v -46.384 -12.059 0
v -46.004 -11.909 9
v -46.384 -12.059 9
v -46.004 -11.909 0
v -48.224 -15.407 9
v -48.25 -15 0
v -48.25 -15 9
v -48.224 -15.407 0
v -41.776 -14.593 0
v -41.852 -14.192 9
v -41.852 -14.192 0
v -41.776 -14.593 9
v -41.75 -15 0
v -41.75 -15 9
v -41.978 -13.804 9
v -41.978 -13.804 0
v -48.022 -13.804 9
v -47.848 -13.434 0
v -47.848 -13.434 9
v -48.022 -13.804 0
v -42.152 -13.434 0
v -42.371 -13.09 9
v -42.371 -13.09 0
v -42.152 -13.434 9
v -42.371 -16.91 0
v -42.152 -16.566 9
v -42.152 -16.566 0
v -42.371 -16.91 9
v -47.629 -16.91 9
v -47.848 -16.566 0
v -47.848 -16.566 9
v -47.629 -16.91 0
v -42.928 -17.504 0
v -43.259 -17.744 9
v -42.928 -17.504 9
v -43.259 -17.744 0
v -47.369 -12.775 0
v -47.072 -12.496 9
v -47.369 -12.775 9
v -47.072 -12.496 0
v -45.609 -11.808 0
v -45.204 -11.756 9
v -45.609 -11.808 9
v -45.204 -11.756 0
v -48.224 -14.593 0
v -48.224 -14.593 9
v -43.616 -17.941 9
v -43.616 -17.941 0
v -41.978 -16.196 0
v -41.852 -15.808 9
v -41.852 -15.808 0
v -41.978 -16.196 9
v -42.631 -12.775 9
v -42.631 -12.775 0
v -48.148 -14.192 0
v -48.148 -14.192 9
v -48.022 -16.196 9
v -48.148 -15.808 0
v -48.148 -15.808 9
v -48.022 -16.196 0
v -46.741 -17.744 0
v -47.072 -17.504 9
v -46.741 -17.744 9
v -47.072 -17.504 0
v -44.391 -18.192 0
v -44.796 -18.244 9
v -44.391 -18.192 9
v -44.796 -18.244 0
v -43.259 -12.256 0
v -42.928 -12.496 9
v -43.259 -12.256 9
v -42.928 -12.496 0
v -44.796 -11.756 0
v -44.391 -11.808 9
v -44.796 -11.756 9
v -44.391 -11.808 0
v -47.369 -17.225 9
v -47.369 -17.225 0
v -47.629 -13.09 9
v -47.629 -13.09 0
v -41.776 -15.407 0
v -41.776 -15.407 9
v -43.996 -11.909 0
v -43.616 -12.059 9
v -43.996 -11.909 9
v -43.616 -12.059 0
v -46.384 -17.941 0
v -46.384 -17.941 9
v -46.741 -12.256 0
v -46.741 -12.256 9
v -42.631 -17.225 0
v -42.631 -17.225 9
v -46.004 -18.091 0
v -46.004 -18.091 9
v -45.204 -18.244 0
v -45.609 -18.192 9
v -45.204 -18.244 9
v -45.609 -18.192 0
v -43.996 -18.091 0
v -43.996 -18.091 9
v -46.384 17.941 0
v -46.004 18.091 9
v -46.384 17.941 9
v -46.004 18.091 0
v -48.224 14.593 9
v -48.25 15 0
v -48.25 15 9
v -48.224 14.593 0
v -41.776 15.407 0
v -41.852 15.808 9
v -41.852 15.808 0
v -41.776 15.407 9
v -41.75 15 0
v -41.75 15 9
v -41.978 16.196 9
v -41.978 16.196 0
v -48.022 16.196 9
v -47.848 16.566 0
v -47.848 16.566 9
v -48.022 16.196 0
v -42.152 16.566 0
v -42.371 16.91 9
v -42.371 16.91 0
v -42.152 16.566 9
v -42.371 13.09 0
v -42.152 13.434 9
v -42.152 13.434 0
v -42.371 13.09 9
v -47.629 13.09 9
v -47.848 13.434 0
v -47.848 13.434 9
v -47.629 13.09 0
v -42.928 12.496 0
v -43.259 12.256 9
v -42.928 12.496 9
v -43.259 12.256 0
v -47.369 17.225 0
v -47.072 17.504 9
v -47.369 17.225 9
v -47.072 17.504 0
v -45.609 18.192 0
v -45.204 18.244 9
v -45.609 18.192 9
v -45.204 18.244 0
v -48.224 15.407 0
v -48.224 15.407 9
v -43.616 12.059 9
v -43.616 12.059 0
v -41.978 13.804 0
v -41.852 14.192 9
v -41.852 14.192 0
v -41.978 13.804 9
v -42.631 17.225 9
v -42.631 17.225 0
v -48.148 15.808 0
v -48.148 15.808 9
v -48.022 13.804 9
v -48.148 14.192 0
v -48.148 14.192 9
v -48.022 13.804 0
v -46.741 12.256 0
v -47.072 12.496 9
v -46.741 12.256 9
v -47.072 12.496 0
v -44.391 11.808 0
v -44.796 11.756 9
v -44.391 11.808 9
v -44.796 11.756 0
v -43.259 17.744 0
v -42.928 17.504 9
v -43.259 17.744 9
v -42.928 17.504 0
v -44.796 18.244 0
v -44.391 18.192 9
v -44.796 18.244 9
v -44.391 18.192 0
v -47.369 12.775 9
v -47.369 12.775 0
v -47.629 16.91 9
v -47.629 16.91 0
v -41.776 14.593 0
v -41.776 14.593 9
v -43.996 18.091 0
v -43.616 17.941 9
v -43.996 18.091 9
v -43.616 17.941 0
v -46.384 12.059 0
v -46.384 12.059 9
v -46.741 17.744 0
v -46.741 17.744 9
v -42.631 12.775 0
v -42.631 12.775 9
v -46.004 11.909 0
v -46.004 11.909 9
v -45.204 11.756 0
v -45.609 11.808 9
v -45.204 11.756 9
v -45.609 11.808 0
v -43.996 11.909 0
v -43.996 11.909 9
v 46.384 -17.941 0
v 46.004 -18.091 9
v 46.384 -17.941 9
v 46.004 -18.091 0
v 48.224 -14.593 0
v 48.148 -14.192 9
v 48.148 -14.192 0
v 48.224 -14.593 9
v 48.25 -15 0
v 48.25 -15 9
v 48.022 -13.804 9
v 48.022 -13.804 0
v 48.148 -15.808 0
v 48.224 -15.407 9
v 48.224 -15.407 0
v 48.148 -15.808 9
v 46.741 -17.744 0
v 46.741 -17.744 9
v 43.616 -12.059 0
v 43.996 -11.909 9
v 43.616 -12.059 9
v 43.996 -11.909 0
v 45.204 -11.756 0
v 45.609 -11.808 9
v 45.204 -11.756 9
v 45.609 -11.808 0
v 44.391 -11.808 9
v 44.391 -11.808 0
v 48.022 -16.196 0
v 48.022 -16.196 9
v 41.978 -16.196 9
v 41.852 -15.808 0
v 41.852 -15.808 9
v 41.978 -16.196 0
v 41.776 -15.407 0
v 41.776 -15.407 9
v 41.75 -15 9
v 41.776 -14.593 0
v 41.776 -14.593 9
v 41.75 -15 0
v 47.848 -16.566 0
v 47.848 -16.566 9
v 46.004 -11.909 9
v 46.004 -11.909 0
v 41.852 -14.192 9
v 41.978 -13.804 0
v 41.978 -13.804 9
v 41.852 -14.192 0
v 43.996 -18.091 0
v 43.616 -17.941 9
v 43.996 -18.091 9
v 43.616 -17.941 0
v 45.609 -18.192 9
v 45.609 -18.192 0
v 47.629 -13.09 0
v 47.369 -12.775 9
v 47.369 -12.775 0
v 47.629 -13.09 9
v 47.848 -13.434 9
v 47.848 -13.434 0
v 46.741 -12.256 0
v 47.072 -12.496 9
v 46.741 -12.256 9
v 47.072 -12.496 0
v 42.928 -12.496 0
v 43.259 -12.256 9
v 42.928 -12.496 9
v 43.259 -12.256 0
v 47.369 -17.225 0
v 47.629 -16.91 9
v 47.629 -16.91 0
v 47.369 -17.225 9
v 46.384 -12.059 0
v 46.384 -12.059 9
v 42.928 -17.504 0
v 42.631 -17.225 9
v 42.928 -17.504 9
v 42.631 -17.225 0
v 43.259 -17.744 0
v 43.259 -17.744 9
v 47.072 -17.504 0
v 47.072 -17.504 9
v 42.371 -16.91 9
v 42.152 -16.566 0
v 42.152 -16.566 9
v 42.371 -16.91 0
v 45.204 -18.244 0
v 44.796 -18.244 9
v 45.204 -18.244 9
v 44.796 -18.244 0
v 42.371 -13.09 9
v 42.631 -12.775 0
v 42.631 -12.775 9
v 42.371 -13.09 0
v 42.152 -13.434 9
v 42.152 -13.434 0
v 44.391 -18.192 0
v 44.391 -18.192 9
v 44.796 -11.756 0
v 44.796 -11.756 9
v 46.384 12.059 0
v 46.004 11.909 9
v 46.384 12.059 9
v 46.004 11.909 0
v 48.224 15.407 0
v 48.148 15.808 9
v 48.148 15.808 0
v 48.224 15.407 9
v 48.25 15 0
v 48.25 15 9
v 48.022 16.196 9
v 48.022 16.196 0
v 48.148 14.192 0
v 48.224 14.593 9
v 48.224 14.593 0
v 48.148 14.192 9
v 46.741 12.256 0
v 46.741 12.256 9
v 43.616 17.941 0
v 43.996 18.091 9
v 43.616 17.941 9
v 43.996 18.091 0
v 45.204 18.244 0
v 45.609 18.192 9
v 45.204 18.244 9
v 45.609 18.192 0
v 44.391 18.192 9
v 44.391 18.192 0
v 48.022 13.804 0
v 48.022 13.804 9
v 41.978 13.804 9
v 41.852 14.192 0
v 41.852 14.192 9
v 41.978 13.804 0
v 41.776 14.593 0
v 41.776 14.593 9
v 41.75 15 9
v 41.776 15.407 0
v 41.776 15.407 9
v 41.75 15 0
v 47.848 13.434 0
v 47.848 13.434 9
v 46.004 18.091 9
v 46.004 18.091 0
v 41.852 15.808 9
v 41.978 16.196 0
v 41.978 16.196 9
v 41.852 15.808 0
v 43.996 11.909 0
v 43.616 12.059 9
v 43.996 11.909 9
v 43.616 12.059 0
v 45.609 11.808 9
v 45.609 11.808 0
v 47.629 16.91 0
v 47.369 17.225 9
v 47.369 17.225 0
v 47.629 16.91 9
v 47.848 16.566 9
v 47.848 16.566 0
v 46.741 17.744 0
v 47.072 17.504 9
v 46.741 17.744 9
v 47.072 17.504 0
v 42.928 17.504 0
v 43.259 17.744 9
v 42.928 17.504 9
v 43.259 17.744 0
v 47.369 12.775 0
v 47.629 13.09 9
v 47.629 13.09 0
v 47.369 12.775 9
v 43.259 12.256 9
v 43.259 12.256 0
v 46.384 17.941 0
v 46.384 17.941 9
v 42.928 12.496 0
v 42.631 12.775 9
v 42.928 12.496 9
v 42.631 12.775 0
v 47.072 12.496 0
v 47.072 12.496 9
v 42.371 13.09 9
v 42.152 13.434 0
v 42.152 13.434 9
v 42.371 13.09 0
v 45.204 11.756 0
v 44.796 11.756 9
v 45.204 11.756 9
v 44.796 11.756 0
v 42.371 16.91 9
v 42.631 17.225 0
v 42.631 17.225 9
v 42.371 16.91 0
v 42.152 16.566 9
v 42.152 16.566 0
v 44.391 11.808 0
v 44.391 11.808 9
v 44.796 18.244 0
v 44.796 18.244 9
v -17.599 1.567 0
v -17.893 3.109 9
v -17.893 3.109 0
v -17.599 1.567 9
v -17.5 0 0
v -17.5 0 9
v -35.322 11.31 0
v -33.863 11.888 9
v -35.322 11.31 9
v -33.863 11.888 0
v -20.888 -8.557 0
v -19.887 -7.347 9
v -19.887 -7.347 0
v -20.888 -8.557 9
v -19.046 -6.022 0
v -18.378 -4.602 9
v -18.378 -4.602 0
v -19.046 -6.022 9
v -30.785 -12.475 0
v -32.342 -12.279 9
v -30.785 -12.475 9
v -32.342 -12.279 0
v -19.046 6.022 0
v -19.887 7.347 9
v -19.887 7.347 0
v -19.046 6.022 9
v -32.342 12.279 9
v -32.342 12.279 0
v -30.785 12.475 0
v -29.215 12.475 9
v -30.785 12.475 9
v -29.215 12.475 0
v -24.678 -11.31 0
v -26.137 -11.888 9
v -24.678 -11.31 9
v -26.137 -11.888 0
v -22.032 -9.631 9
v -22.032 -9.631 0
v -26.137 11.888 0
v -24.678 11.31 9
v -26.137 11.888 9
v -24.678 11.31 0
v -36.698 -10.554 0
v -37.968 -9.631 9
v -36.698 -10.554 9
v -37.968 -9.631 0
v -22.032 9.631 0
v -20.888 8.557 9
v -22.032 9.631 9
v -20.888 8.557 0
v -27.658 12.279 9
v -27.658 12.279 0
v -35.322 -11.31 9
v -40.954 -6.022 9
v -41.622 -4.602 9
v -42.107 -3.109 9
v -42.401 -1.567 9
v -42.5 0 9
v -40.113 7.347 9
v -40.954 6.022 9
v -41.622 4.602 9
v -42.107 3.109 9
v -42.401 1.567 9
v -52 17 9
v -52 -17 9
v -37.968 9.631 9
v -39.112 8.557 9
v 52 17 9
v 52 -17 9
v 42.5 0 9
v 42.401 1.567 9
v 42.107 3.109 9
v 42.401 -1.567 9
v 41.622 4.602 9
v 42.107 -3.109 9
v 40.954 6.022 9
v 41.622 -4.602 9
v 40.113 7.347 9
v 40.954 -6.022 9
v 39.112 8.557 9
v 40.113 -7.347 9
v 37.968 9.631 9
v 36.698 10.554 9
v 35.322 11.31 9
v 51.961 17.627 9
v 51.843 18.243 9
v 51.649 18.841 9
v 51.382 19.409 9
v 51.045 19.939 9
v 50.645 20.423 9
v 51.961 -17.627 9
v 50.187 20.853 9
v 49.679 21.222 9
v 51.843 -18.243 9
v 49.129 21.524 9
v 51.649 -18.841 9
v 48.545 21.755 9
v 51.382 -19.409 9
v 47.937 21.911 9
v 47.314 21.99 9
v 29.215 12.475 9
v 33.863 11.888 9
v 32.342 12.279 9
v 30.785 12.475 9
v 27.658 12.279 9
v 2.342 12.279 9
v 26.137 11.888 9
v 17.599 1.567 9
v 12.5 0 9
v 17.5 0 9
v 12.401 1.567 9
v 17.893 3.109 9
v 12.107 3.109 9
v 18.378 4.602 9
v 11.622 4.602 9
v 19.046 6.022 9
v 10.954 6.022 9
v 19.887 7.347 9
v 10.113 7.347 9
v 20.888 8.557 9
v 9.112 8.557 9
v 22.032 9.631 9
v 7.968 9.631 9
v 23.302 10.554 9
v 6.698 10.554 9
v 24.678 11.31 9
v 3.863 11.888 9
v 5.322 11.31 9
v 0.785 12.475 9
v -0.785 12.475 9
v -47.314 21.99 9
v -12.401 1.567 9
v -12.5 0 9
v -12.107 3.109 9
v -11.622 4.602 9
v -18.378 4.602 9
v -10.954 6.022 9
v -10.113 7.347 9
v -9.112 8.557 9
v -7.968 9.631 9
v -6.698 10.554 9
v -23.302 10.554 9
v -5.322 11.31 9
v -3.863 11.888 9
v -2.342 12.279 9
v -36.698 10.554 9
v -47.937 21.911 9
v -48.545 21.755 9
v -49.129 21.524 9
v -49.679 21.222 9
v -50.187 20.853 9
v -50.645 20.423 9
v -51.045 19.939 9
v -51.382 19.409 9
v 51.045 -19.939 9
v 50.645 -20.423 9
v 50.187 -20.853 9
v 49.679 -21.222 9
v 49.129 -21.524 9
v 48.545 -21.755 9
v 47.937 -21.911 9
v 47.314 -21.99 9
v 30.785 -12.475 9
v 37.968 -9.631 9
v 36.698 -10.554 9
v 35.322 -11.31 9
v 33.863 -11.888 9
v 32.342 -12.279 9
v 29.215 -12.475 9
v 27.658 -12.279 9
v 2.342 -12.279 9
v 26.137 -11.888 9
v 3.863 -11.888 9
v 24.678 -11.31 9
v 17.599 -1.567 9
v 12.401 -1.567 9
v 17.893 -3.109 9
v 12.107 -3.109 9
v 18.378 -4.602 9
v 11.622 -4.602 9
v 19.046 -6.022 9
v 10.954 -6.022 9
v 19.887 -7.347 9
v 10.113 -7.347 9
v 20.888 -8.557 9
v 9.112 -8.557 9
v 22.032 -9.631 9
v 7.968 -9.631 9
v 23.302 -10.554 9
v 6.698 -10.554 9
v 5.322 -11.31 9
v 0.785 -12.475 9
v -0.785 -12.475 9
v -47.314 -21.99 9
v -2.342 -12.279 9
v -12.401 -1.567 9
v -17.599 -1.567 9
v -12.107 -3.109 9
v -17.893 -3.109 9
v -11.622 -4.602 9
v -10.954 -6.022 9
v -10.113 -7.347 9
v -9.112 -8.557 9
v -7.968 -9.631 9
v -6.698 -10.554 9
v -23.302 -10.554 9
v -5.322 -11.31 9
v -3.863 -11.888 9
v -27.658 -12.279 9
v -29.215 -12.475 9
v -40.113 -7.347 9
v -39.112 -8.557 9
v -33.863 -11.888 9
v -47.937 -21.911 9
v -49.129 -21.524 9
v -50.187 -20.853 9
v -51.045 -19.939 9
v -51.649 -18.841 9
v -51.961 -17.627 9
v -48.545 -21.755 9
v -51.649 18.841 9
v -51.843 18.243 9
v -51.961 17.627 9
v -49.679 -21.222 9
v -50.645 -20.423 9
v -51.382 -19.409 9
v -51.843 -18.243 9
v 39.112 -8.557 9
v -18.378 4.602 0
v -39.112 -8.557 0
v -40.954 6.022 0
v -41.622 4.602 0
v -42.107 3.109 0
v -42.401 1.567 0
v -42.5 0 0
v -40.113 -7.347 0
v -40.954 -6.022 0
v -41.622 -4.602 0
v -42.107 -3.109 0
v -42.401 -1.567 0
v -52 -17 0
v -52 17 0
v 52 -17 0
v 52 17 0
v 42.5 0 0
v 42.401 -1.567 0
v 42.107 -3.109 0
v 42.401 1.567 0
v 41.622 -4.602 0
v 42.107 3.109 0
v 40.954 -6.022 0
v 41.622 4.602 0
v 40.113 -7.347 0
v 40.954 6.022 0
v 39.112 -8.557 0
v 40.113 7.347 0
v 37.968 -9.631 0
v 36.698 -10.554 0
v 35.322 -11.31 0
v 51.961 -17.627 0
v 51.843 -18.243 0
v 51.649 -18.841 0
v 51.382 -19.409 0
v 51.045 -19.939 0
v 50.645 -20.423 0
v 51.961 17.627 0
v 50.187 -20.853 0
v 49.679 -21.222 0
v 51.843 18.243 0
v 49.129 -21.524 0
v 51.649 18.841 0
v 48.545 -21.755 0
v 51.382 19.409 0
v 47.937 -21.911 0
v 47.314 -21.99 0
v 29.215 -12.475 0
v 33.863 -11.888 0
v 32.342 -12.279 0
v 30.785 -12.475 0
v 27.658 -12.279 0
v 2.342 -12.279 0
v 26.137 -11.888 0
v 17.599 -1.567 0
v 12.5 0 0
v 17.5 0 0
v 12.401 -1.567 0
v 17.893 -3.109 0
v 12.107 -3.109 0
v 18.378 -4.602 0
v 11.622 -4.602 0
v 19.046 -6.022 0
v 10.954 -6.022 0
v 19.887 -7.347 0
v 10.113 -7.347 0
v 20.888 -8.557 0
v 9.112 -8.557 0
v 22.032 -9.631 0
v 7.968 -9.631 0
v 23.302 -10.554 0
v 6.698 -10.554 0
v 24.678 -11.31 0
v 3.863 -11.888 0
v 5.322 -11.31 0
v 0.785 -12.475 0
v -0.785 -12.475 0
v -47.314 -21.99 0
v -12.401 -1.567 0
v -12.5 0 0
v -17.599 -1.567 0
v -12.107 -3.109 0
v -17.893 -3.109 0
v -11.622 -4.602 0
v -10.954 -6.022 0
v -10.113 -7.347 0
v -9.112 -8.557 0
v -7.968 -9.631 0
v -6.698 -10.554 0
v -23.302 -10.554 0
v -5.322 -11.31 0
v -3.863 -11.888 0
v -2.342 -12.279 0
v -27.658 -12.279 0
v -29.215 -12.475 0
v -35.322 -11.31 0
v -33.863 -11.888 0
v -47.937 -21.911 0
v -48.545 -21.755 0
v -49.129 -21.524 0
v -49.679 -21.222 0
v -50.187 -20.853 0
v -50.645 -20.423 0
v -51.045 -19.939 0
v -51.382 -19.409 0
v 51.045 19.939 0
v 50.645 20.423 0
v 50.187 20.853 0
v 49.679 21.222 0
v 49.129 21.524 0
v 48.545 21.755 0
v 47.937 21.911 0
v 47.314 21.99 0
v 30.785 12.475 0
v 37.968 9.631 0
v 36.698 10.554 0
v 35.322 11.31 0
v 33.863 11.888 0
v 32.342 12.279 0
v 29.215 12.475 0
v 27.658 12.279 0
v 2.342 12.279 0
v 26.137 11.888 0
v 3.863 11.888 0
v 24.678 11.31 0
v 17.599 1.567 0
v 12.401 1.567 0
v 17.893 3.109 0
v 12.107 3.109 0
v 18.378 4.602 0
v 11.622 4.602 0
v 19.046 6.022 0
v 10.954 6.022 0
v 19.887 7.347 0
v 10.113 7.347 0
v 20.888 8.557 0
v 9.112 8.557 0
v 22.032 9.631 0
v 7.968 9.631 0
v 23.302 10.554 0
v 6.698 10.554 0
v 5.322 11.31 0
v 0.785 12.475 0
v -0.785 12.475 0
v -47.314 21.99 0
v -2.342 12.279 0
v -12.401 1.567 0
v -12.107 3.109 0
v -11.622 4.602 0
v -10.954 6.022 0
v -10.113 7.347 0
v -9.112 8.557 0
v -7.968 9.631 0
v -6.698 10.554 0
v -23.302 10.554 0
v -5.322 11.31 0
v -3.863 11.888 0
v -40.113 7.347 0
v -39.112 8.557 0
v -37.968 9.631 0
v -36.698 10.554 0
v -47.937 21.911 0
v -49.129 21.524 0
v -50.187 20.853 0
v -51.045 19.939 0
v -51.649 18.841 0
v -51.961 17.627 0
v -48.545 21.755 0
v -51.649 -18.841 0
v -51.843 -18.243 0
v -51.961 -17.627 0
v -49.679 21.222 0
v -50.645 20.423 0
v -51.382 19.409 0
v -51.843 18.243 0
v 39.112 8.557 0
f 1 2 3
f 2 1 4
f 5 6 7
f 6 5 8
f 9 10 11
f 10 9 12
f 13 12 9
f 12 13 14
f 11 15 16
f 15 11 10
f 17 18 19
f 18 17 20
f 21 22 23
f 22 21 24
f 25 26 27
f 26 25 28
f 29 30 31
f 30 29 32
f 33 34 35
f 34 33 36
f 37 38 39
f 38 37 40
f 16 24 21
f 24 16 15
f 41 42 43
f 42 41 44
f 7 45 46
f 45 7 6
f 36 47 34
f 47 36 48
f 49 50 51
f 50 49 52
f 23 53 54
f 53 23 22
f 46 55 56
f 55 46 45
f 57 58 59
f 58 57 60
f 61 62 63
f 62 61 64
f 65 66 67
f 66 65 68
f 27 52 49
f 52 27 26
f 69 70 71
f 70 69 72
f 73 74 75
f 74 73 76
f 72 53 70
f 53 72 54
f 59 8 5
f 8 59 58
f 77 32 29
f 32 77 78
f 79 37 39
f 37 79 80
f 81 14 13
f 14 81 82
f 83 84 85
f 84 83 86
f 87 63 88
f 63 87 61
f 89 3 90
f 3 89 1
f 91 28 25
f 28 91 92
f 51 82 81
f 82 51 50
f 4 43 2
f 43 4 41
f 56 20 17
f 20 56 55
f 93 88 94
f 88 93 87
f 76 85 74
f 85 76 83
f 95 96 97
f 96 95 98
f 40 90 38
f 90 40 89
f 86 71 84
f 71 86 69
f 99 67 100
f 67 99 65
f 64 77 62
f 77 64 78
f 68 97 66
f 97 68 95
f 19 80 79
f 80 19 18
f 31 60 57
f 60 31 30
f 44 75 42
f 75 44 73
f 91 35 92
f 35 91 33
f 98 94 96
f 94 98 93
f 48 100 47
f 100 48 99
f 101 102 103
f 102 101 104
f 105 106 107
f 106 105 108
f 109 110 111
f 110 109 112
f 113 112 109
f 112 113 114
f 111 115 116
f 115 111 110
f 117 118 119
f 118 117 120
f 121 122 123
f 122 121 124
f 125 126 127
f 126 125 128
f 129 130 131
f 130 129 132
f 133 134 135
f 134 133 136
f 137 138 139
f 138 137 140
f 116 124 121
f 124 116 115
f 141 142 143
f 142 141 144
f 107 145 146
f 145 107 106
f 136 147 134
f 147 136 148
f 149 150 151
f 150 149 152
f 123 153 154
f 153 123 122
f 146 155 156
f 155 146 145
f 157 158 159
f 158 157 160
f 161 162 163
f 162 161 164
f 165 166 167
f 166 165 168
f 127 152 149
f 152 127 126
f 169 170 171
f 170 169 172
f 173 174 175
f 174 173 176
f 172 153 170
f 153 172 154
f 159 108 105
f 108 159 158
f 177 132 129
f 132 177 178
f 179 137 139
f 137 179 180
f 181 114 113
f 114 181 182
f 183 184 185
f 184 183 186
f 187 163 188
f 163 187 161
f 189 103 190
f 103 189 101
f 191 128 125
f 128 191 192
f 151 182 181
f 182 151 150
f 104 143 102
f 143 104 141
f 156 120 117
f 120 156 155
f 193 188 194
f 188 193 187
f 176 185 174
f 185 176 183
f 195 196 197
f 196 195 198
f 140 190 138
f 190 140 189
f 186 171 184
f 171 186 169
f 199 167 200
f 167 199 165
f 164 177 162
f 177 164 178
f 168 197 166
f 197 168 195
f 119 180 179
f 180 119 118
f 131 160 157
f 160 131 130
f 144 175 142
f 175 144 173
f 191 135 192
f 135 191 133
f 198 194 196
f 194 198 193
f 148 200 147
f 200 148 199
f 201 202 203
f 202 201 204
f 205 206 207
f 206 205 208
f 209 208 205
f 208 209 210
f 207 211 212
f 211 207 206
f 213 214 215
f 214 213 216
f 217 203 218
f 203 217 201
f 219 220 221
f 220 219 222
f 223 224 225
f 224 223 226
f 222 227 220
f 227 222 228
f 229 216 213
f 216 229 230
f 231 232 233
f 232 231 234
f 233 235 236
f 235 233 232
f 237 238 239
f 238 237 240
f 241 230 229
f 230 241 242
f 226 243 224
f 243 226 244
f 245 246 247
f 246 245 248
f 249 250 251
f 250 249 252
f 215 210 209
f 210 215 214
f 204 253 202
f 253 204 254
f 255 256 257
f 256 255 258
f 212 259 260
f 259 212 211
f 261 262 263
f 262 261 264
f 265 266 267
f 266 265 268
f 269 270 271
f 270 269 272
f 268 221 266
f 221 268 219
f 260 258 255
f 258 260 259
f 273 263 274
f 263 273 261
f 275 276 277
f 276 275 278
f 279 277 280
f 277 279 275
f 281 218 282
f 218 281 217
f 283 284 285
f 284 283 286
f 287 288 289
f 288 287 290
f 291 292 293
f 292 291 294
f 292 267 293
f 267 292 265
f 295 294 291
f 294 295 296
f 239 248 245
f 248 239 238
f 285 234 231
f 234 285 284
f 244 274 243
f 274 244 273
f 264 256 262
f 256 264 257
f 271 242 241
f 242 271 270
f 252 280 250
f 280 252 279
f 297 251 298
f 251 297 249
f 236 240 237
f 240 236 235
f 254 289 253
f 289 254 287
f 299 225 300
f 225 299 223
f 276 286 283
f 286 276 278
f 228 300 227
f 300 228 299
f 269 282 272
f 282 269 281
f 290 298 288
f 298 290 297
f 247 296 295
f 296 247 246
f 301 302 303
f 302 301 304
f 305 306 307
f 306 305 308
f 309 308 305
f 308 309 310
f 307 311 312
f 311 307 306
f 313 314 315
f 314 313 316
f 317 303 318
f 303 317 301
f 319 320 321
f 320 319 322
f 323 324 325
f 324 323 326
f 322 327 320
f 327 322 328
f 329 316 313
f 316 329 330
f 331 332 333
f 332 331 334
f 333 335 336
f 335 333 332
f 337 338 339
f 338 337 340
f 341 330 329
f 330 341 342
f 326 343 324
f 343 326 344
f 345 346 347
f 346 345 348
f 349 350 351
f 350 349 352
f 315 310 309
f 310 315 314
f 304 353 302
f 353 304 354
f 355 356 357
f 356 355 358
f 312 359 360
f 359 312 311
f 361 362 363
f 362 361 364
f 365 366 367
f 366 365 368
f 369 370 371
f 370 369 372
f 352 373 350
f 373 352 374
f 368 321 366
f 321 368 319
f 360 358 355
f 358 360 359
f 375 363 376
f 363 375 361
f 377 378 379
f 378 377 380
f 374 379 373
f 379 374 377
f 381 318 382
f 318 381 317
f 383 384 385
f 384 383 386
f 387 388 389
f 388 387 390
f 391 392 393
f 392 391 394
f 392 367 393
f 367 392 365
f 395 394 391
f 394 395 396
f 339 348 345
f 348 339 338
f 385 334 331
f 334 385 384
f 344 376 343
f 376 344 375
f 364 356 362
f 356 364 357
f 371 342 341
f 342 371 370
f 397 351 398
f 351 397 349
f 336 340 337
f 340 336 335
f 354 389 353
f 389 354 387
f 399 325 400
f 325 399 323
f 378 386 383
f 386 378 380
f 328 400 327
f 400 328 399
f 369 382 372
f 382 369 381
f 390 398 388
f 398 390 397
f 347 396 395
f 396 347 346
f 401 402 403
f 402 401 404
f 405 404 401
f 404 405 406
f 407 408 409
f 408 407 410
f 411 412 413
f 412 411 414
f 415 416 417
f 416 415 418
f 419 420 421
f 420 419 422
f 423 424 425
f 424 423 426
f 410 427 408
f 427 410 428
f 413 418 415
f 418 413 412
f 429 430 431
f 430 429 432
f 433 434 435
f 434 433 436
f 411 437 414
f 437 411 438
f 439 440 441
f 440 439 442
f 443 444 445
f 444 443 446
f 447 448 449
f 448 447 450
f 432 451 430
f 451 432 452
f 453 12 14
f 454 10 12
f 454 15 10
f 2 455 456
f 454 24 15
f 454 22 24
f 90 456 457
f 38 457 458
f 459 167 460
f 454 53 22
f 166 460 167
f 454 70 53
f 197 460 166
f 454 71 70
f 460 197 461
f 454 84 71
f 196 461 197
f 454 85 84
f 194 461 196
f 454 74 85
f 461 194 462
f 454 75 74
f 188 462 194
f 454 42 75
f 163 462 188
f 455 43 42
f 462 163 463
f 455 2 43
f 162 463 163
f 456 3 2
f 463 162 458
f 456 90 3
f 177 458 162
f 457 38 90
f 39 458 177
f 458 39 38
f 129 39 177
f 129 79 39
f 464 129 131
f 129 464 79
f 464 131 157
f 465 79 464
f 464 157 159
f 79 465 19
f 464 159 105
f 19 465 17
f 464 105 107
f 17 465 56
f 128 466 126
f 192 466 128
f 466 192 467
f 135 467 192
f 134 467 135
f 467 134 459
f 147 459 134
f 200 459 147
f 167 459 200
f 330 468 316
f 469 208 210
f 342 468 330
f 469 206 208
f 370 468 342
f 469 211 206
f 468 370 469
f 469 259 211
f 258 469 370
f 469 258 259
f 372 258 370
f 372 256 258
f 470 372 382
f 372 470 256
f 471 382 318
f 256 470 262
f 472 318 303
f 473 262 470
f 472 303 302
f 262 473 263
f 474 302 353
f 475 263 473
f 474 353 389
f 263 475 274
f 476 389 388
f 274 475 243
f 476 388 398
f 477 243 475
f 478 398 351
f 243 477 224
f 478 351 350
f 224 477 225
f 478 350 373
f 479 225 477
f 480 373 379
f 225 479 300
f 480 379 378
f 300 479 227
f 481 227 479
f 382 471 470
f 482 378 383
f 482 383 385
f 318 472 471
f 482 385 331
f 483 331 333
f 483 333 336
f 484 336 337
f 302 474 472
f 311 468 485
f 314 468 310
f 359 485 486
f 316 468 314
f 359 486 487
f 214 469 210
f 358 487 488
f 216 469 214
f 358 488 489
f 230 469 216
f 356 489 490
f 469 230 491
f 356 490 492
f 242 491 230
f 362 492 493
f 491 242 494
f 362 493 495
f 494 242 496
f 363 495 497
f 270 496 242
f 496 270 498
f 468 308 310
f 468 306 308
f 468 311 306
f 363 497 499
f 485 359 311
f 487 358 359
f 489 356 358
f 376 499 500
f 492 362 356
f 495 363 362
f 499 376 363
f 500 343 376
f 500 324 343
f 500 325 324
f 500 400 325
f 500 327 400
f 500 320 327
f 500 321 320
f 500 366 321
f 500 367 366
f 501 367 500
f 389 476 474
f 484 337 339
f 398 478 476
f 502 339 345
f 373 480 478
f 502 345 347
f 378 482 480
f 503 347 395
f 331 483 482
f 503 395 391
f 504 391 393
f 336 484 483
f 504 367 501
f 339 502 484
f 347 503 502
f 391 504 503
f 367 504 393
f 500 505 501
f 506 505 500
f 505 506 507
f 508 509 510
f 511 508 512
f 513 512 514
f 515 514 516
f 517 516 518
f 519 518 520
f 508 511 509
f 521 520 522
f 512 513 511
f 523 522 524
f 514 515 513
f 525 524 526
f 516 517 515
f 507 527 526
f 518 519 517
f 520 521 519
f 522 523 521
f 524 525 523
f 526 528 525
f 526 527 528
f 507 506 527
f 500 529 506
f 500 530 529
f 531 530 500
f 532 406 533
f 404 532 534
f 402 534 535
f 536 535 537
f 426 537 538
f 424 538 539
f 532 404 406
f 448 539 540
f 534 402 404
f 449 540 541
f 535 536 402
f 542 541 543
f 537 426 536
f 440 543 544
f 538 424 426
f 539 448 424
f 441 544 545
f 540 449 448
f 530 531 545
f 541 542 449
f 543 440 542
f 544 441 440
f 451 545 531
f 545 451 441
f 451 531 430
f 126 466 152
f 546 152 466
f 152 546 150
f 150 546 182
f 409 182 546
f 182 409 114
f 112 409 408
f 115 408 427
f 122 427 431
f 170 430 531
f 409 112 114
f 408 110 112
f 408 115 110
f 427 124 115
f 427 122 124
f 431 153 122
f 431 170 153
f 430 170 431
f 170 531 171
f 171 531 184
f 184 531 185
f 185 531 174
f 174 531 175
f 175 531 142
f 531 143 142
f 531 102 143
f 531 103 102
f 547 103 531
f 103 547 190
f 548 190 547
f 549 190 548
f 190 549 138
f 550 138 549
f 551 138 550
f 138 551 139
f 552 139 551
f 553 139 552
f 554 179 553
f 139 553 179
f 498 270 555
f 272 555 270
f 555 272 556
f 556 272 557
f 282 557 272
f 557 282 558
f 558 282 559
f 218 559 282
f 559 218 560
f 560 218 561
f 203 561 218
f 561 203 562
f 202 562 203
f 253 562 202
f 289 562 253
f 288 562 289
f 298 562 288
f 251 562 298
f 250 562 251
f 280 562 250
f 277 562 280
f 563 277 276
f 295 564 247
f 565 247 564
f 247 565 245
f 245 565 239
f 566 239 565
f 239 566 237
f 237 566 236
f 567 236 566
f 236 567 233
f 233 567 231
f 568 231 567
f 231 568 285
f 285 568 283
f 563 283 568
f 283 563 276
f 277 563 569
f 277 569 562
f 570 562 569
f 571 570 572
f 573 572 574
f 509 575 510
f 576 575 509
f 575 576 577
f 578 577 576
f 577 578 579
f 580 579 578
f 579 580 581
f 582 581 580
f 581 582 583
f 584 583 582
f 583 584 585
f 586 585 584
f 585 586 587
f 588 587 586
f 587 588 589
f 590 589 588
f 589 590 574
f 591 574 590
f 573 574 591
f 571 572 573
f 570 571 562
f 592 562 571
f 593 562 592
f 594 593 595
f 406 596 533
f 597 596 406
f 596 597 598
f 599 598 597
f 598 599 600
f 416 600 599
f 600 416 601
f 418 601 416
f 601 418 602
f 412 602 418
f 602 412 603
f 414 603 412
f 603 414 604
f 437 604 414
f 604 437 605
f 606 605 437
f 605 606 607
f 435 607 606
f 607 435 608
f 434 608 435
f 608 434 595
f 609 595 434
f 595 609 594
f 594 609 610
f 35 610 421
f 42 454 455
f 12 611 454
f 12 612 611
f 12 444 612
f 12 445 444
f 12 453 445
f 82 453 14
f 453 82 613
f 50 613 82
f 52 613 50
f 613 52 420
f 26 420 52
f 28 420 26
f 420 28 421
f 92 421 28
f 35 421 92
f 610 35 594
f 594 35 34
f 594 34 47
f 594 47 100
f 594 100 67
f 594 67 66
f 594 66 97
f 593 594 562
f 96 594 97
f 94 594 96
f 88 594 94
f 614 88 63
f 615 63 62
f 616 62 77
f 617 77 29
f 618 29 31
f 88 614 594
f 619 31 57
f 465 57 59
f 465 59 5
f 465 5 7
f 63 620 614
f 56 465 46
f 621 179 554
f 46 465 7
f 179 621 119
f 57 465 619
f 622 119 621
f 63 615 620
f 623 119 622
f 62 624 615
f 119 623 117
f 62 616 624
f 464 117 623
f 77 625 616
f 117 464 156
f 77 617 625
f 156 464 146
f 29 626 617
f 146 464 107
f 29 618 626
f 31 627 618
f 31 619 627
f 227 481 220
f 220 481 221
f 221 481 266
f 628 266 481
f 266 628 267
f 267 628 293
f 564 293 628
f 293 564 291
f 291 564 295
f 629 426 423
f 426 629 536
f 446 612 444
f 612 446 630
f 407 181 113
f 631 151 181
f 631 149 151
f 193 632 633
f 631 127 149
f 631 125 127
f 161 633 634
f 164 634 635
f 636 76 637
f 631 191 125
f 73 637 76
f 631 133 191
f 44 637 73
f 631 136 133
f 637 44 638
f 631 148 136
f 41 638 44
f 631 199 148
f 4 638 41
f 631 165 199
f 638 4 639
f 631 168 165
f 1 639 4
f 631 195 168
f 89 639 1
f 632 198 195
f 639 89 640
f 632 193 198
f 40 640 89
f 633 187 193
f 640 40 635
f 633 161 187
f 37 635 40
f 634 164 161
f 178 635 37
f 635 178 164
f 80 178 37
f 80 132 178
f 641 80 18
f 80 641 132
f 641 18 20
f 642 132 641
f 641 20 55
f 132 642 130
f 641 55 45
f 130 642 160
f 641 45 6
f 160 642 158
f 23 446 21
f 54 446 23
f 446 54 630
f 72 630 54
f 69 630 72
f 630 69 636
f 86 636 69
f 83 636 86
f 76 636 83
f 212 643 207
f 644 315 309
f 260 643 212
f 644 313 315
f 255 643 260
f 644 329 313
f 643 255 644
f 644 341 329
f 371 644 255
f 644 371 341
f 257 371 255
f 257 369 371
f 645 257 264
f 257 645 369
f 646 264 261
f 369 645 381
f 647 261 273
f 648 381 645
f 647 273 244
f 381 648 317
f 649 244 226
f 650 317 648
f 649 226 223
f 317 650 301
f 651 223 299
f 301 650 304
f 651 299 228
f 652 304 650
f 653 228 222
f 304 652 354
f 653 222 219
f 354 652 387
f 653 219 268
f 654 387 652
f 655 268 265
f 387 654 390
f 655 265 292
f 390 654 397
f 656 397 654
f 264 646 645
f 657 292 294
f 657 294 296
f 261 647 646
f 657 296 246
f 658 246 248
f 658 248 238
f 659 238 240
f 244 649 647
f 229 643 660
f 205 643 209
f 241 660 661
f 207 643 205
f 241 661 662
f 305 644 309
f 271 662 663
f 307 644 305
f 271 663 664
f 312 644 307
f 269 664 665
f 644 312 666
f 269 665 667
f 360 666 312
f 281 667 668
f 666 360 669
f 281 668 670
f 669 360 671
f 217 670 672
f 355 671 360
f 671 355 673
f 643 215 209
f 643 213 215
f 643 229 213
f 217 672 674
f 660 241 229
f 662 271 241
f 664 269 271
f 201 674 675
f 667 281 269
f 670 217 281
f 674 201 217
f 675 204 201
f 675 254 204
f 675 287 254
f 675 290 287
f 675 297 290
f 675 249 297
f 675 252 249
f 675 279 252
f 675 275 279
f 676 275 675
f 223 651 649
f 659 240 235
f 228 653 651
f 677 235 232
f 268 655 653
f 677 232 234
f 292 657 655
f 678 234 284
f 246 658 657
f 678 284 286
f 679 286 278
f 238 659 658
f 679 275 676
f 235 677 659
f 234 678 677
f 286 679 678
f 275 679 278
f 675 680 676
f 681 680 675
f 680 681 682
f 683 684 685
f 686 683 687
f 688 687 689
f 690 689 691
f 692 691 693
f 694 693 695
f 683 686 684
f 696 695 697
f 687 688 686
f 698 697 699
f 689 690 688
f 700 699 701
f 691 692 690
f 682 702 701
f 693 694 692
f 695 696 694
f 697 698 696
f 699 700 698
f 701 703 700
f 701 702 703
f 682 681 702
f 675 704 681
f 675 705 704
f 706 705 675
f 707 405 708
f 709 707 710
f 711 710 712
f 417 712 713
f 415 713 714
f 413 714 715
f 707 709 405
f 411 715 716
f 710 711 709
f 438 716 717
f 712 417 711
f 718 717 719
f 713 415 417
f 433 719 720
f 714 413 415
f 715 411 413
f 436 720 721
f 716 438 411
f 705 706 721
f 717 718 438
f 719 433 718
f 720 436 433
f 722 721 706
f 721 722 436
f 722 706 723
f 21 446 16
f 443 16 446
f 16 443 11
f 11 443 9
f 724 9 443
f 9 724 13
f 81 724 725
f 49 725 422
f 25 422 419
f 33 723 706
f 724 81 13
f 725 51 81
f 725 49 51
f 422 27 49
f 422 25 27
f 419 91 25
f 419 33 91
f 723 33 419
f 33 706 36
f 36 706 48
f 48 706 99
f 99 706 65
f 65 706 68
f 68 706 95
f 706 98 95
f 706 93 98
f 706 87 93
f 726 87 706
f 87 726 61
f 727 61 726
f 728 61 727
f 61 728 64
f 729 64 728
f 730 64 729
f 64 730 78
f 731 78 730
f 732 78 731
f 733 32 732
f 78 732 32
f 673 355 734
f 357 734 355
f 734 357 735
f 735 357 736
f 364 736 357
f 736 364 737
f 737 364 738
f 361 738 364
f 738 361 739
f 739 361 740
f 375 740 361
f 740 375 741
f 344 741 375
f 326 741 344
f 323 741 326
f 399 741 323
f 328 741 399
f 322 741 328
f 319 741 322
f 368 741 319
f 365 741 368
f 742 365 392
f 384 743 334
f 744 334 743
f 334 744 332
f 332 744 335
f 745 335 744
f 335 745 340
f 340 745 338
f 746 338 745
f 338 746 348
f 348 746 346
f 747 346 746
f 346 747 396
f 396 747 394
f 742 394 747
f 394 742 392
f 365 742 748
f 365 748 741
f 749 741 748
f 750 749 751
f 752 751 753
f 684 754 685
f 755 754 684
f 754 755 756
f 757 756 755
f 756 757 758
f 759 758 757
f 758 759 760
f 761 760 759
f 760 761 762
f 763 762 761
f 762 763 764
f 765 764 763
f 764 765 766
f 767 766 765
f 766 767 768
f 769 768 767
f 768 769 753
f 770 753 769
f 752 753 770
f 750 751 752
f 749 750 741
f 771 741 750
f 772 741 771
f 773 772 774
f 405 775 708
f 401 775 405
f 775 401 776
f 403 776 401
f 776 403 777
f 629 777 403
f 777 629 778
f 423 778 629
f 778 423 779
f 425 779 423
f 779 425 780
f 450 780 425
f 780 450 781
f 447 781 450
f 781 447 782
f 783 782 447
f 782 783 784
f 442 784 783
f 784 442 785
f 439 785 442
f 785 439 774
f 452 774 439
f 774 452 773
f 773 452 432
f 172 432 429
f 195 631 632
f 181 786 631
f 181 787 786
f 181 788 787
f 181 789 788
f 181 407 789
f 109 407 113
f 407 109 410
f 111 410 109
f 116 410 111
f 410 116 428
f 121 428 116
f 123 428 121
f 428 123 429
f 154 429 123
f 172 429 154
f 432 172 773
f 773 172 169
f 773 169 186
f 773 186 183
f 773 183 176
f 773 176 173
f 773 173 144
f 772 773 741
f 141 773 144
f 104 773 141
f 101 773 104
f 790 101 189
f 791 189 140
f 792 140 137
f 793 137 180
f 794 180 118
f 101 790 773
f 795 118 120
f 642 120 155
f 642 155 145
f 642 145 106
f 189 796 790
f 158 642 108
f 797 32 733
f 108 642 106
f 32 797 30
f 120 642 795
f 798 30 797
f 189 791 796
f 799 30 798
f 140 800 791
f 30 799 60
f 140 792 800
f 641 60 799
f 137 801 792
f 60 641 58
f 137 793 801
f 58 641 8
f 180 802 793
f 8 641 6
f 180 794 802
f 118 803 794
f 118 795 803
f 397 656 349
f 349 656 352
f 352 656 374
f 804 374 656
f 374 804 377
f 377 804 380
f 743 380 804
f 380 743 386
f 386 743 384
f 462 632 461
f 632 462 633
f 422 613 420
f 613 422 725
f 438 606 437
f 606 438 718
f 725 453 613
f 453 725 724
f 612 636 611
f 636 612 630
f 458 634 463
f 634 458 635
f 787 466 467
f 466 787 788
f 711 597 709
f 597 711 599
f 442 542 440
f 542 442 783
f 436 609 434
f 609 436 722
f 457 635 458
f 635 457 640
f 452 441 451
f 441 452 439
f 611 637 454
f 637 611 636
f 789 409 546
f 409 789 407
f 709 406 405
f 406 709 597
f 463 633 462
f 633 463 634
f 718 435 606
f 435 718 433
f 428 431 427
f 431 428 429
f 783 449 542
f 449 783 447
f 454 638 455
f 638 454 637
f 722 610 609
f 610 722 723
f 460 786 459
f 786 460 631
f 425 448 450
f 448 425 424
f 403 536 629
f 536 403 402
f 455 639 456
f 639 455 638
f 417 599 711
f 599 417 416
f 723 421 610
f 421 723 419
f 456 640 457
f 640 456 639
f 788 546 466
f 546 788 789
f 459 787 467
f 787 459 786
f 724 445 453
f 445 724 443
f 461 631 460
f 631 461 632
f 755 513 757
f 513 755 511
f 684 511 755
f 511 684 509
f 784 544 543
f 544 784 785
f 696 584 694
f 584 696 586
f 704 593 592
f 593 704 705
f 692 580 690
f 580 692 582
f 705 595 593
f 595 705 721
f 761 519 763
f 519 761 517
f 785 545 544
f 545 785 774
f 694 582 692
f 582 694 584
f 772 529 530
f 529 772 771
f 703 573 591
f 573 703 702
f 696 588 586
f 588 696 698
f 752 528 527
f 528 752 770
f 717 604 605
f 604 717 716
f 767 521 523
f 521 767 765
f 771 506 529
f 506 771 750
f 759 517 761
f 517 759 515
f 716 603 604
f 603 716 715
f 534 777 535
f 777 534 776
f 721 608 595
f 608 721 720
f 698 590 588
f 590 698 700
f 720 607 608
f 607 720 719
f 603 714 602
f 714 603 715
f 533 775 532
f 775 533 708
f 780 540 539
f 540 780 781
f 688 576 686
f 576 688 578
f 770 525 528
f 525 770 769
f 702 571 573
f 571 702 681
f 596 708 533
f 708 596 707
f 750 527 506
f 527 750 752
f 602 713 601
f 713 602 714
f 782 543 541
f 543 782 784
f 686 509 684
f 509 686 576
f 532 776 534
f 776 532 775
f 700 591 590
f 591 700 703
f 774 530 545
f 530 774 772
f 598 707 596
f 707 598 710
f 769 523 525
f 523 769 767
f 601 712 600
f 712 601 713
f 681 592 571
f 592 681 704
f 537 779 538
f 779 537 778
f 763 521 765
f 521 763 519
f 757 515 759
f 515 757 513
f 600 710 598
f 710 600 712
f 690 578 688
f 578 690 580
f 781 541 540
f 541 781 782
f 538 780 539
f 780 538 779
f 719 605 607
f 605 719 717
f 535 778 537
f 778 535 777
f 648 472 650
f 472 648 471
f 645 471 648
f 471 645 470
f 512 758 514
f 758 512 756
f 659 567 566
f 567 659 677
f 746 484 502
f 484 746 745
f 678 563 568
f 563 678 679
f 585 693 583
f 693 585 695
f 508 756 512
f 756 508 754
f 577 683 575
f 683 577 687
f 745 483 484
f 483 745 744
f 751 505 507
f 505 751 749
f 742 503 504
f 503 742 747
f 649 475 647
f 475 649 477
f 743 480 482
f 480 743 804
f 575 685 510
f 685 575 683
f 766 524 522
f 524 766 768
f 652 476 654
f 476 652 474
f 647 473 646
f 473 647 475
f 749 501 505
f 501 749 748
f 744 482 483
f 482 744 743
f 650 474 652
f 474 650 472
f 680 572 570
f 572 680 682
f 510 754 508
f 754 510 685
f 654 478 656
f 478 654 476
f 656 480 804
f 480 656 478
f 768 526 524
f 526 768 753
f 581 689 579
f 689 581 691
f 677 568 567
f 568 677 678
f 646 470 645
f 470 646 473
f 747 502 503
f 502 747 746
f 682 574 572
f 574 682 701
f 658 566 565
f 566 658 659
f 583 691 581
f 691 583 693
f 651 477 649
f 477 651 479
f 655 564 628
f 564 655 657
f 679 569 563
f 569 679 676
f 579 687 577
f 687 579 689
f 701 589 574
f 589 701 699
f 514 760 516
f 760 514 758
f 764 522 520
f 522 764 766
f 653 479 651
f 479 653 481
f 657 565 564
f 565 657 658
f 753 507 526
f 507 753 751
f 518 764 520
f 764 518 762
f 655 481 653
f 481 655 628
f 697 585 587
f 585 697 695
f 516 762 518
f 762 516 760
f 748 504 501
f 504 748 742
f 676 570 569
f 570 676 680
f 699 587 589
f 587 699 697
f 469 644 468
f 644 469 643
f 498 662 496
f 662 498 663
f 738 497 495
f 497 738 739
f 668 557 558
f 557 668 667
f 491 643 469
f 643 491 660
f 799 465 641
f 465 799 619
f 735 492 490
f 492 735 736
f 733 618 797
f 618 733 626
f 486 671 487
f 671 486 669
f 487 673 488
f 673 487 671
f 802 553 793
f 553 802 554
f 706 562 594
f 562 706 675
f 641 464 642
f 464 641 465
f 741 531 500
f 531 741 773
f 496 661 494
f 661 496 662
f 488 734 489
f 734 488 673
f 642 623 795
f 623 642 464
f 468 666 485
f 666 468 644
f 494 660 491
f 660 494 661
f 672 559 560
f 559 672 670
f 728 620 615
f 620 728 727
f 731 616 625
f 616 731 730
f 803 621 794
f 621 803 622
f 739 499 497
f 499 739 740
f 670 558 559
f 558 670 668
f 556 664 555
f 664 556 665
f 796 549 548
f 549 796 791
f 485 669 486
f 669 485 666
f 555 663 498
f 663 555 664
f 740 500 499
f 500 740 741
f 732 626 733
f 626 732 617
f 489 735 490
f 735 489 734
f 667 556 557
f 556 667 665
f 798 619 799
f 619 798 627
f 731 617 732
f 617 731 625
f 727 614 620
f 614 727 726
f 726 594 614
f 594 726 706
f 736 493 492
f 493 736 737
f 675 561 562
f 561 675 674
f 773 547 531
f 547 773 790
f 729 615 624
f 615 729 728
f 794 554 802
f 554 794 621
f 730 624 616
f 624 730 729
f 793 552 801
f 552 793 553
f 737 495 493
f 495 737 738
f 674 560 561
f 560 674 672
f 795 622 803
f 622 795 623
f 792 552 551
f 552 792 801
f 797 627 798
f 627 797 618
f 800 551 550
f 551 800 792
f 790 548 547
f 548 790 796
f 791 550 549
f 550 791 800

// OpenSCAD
$fn = 50;

difference() {
	union() {
		hull() {
			translate(v = [-47.0, 17.0, 0]) {
				cylinder(h = 9, r = 5);
			}
			translate(v = [47.0, 17.0, 0]) {
				cylinder(h = 9, r = 5);
			}
			translate(v = [-47.0, -17.0, 0]) {
				cylinder(h = 9, r = 5);
			}
			translate(v = [47.0, -17.0, 0]) {
				cylinder(h = 9, r = 5);
			}
		}
	}
	union() {
		translate(v = [-45.0, -15.0, -100.0]) {
			cylinder(h = 200, r = 3.25);
		}
		translate(v = [-45.0, 15.0, -100.0]) {
			cylinder(h = 200, r = 3.25);
		}
		translate(v = [45.0, -15.0, -100.0]) {
			cylinder(h = 200, r = 3.25);
		}
		translate(v = [45.0, 15.0, -100.0]) {
			cylinder(h = 200, r = 3.25);
		}
		translate(v = [-45.0, -15.0, -100.0]) {
			cylinder(h = 200, r = 1.8);
		}
		translate(v = [-45.0, 15.0, -100.0]) {
			cylinder(h = 200, r = 1.8);
		}
		translate(v = [45.0, -15.0, -100.0]) {
			cylinder(h = 200, r = 1.8);
		}
		translate(v = [45.0, 15.0, -100.0]) {
			cylinder(h = 200, r = 1.8);
		}
		translate(v = [-30.0, 0, 0.0]) {
			cylinder(h = 9, r = 12.5);
		}
		cylinder(h = 9, r = 12.5);
		translate(v = [30.0, 0, 0.0]) {
			cylinder(h = 9, r = 12.5);
		}
	}
}
